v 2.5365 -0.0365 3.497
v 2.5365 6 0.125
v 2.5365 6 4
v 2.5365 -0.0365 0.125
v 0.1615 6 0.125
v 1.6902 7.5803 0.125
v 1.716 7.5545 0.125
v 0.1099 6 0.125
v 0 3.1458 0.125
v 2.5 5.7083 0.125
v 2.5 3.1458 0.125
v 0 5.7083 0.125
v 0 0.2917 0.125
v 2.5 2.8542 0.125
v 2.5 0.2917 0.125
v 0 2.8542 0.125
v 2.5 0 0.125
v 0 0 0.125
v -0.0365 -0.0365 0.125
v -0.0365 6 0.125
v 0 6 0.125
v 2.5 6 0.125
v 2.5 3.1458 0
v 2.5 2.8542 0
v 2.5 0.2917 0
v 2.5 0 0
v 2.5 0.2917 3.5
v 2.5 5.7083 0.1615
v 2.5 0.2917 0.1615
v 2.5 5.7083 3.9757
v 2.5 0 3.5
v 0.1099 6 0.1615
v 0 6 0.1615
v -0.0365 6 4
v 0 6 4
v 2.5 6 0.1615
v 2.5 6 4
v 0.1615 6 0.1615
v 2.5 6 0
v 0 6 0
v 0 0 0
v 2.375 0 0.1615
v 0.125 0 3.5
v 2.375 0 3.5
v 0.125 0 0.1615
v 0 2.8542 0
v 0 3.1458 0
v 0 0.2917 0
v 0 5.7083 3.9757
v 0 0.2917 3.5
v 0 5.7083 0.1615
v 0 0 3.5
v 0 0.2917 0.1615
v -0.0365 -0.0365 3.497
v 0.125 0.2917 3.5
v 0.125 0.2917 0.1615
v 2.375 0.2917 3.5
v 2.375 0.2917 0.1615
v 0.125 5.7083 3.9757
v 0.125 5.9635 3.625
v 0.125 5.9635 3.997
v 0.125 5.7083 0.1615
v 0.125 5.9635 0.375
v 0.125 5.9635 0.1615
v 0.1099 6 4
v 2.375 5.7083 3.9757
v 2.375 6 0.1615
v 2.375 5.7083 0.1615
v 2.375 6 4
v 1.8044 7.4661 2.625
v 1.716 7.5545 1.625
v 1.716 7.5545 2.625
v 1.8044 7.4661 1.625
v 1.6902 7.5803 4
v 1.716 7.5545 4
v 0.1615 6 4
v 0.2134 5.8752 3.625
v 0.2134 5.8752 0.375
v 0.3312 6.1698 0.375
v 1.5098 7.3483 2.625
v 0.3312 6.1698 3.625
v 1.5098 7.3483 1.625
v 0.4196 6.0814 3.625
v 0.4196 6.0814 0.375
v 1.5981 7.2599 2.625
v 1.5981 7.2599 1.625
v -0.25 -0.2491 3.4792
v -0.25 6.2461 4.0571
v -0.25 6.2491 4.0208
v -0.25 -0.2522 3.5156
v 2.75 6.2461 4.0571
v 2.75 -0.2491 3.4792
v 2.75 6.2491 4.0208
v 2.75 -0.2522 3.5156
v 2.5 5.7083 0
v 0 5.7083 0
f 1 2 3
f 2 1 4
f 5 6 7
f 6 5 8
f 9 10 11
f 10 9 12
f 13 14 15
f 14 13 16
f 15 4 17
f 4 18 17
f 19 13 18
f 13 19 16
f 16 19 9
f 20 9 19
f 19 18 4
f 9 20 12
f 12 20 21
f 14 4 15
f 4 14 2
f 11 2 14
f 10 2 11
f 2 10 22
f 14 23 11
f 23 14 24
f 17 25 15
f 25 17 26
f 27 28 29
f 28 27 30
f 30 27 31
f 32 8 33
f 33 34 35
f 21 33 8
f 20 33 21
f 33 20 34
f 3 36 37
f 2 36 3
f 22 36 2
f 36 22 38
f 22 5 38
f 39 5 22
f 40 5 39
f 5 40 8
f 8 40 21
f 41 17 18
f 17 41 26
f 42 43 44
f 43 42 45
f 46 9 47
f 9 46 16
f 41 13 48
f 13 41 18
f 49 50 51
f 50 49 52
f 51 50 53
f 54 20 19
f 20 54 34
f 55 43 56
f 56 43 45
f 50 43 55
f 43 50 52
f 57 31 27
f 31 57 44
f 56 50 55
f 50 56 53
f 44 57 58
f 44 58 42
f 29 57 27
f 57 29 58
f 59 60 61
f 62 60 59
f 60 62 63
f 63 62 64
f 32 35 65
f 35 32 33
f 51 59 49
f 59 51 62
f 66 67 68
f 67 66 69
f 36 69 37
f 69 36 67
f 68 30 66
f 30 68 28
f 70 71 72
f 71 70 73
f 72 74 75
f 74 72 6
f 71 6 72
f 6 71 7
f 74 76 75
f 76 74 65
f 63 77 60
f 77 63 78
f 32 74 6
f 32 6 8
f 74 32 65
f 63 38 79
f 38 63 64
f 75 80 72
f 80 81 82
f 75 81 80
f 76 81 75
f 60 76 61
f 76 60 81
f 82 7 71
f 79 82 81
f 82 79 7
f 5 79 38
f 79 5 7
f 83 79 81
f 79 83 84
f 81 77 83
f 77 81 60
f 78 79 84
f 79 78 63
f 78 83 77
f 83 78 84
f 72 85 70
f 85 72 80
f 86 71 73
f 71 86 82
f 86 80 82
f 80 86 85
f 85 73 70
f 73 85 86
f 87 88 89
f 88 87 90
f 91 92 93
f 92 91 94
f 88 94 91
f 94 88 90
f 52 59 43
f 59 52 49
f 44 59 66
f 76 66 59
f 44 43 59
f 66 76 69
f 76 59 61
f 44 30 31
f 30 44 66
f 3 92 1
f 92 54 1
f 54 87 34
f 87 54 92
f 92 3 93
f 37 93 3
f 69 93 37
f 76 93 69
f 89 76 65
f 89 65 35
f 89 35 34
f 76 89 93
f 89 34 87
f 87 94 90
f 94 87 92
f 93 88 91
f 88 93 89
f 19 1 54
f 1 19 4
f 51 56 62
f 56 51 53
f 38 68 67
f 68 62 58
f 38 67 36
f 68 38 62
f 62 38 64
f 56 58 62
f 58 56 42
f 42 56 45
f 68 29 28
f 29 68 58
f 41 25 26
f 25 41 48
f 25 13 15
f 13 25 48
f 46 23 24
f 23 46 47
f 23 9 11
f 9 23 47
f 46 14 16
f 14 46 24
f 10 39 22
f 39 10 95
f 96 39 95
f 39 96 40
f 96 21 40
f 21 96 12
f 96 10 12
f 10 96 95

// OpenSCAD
front_inner_height = 4; // ft
back_inner_height = 3.5; // ft
inner_width = 2.5; // ft
inner_depth = 6; // ft
wall_thickness = 7/16/12; // ft

roof_overhang = 3/12;
roof_rise = front_inner_height - back_inner_height;
roof_width = inner_width + 2 * roof_overhang;
roof_depth = sqrt(pow(inner_depth, 2) + pow(roof_rise, 2)) + 2 * roof_overhang;
roof_angle = atan(roof_rise / inner_depth);

echo(str("roof angle: ", roof_angle, " deg"));

member_width = 1.5/12; // ft
member_depth = 3.5/12; // ft

module member(size, desc) {
  echo(desc);
  for (i = [0:2]) {
    feet = floor(size[i]);
    inches = (size[i] - feet) * 12;
    echo(str("\t", feet, "'", inches, "\","));
  }
  cube(size);
}

// roof
module roof_transform() {
  translate([0, 0, back_inner_height]) {
    rotate([roof_angle, 0, 0]) {
      translate([-roof_overhang, -roof_overhang, 0]) {
        children();
      };
    };
  };
};

module roof_truncate() {
  difference() {
    children();
    roof_transform() {
      cube([roof_width + 1, roof_depth + 1, 5]);
    };
  };
};

roof_transform() {
  member([roof_width, roof_depth, wall_thickness], "roof");
};

// back
translate([-wall_thickness, -wall_thickness, member_width]) {
  member([inner_width + 2 * wall_thickness, wall_thickness, back_inner_height - member_width], "back");
};

// left & right wall
roof_truncate() {
  union() {
    translate([inner_width, 0, member_width]) { // left
      member([wall_thickness, inner_depth, front_inner_height], "left wall");
    };
    translate([-wall_thickness, 0, member_width]) { // right
      member([wall_thickness, inner_depth, front_inner_height], "right wall");
    };
  };
};

// supports
module support(height, desc) {
  translate([0, 0, member_width]) {
    member([member_width, member_depth, height], desc);
  };
};

module support_pair(height, desc) {
  translate([0, 0, 0]) {
    support(height - member_width, str(desc, " right"));
  };
  translate([inner_width - member_width, 0, 0]) {
    support(height - member_width, str(desc, " left"));
  };
};

translate([0, 0, 0]) {
  support_pair(back_inner_height, "support - back");
};
translate([0, inner_depth - member_depth, 0]) {
  support_pair(front_inner_height, "support - front");
};

// door
translate([member_width, inner_depth - wall_thickness, member_width]) {
  rotate([0, 0, 45]) {
    member([inner_width - 2 * member_width, wall_thickness, front_inner_height - member_width], "door");
    translate([0, -member_width, 0.25]) {
      member([member_depth, member_width, 3.25], "door hinge screw bed");
    };
    translate([inner_width - 2 * member_width - member_depth, -member_width, 1.5]) {
      member([member_depth, member_width, 1], "door hasp screw bed");
    };
  };
};

// floor
translate([0, 0, member_width]) {
  member([inner_width, inner_depth, wall_thickness], "floor");
};
translate([0, 0, 0]) {
  member([inner_width, member_depth, member_width], "floor support");
};
translate([0, (inner_depth - member_depth) / 2, 0]) {
  member([inner_width, member_depth, member_width], "floor support");
};
translate([0, inner_depth - member_depth, 0]) {
  member([inner_width, member_depth, member_width], "floor support");
};
